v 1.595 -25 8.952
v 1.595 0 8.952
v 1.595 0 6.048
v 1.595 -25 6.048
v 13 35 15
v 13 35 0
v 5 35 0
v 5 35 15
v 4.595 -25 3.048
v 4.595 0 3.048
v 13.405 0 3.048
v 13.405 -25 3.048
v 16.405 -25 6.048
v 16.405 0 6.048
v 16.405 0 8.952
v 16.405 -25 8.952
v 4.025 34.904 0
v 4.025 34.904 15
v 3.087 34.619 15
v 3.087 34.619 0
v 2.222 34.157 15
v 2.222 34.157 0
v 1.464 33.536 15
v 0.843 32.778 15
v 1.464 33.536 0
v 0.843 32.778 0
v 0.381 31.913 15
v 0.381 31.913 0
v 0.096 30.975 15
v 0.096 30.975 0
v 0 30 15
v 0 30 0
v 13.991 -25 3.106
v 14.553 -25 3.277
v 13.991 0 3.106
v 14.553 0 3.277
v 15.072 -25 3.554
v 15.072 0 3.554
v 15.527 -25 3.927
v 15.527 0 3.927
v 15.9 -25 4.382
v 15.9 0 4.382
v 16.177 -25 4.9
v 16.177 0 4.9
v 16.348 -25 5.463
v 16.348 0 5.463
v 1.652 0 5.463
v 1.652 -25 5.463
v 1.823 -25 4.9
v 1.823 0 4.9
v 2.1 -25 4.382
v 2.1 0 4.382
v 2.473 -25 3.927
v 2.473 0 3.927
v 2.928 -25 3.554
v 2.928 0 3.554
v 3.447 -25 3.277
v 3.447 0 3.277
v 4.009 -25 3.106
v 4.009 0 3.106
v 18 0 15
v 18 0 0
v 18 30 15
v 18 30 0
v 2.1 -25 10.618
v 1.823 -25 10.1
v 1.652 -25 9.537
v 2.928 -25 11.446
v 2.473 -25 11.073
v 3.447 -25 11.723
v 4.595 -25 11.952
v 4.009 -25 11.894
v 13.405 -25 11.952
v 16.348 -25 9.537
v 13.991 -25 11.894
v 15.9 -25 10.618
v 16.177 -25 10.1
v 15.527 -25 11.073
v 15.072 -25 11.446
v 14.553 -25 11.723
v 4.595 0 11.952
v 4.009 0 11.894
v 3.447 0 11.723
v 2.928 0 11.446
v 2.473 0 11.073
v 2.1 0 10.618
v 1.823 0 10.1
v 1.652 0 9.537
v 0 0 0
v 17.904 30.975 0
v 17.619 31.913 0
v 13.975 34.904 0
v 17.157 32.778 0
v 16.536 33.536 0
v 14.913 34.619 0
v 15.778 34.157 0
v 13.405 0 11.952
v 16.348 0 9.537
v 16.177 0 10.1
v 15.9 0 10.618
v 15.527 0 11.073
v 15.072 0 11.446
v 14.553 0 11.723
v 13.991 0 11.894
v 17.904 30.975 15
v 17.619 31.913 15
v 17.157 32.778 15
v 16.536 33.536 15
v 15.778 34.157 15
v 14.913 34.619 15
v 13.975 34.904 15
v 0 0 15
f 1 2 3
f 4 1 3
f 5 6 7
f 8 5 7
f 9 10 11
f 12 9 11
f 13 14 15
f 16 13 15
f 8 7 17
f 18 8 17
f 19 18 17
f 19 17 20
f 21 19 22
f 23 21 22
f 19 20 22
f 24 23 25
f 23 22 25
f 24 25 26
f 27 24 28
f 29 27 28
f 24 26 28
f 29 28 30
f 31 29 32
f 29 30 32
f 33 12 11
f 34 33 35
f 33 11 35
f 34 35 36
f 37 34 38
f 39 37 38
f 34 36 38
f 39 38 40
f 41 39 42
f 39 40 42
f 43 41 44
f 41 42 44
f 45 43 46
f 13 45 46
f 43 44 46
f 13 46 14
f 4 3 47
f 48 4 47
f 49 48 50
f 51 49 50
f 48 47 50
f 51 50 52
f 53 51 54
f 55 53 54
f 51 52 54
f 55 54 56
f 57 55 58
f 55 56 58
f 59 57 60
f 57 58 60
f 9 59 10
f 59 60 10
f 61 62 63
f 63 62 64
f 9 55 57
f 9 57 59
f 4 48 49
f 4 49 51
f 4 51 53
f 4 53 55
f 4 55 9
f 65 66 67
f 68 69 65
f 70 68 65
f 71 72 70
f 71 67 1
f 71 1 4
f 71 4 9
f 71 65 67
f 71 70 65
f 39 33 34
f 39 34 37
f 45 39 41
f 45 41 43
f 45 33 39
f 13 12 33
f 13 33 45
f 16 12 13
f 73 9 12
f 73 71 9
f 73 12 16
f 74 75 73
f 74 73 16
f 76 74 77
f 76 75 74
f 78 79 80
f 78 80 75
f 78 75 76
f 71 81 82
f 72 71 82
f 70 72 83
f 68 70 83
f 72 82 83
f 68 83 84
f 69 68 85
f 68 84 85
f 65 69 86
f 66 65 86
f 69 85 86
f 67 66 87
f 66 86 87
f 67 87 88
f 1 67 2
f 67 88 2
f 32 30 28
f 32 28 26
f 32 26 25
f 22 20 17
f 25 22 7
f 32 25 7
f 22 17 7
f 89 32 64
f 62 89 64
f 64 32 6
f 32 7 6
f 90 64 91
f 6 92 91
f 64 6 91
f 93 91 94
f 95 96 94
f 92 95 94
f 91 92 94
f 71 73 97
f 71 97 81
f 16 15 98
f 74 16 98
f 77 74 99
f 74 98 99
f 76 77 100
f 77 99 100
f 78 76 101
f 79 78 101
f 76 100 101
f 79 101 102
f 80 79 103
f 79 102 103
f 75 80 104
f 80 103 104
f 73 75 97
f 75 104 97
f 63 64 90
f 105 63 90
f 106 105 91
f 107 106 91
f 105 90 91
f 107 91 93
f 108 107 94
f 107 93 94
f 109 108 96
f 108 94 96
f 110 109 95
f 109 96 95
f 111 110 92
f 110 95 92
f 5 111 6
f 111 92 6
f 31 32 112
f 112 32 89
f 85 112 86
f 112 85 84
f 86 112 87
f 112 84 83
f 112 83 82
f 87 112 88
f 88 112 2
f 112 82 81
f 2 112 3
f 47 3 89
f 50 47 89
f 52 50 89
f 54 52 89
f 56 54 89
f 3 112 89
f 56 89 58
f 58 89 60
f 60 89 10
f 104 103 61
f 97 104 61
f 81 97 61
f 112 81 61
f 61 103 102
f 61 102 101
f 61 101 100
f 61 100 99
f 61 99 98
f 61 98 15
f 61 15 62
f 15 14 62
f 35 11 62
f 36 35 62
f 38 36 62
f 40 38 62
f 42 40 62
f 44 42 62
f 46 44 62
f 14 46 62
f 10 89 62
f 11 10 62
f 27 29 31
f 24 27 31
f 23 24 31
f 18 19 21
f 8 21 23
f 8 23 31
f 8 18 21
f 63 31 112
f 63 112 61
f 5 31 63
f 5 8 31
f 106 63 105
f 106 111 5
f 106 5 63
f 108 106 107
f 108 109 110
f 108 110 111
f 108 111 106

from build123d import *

# Parameters (mm, degrees)
F1_DEPTH = 15
F3_DEPTH = 25


with BuildPart() as f1:
    # F0 (on Top) → F1 (new body)
    with BuildSketch(Plane.XY):
        with BuildLine():
            Line((0, 30), (0, 0))
            Line((0, 0), (18, 0))
            Line((18, 0), (18, 30))
            ThreePointArc((18, 30), (16.535534, 33.535534), (13, 35))
            Line((13, 35), (5, 35))
            ThreePointArc((5, 35), (1.464466, 33.535534), (0, 30))
        make_face()
    extrude(amount=F1_DEPTH)

    # F2 (on face) → F3 (join)
    with BuildSketch(Plane.XZ):
        with BuildLine():
            ThreePointArc((16.405338, 8.951662), (15.526659, 11.072982), (13.405338, 11.951662))
            Line((13.405338, 11.951662), (4.594662, 11.951662))
            ThreePointArc((4.594662, 11.951662), (2.473341, 11.072982), (1.594662, 8.951662))
            Line((1.594662, 8.951662), (1.594662, 6.048338))
            ThreePointArc((1.594662, 6.048338), (2.473341, 3.927018), (4.594662, 3.048338))
            Line((4.594662, 3.048338), (13.405338, 3.048338))
            ThreePointArc((13.405338, 3.048338), (15.526659, 3.927018), (16.405338, 6.048338))
            Line((16.405338, 6.048338), (16.405338, 8.951662))
        make_face()
    extrude(amount=F3_DEPTH)


solid = f1.part
